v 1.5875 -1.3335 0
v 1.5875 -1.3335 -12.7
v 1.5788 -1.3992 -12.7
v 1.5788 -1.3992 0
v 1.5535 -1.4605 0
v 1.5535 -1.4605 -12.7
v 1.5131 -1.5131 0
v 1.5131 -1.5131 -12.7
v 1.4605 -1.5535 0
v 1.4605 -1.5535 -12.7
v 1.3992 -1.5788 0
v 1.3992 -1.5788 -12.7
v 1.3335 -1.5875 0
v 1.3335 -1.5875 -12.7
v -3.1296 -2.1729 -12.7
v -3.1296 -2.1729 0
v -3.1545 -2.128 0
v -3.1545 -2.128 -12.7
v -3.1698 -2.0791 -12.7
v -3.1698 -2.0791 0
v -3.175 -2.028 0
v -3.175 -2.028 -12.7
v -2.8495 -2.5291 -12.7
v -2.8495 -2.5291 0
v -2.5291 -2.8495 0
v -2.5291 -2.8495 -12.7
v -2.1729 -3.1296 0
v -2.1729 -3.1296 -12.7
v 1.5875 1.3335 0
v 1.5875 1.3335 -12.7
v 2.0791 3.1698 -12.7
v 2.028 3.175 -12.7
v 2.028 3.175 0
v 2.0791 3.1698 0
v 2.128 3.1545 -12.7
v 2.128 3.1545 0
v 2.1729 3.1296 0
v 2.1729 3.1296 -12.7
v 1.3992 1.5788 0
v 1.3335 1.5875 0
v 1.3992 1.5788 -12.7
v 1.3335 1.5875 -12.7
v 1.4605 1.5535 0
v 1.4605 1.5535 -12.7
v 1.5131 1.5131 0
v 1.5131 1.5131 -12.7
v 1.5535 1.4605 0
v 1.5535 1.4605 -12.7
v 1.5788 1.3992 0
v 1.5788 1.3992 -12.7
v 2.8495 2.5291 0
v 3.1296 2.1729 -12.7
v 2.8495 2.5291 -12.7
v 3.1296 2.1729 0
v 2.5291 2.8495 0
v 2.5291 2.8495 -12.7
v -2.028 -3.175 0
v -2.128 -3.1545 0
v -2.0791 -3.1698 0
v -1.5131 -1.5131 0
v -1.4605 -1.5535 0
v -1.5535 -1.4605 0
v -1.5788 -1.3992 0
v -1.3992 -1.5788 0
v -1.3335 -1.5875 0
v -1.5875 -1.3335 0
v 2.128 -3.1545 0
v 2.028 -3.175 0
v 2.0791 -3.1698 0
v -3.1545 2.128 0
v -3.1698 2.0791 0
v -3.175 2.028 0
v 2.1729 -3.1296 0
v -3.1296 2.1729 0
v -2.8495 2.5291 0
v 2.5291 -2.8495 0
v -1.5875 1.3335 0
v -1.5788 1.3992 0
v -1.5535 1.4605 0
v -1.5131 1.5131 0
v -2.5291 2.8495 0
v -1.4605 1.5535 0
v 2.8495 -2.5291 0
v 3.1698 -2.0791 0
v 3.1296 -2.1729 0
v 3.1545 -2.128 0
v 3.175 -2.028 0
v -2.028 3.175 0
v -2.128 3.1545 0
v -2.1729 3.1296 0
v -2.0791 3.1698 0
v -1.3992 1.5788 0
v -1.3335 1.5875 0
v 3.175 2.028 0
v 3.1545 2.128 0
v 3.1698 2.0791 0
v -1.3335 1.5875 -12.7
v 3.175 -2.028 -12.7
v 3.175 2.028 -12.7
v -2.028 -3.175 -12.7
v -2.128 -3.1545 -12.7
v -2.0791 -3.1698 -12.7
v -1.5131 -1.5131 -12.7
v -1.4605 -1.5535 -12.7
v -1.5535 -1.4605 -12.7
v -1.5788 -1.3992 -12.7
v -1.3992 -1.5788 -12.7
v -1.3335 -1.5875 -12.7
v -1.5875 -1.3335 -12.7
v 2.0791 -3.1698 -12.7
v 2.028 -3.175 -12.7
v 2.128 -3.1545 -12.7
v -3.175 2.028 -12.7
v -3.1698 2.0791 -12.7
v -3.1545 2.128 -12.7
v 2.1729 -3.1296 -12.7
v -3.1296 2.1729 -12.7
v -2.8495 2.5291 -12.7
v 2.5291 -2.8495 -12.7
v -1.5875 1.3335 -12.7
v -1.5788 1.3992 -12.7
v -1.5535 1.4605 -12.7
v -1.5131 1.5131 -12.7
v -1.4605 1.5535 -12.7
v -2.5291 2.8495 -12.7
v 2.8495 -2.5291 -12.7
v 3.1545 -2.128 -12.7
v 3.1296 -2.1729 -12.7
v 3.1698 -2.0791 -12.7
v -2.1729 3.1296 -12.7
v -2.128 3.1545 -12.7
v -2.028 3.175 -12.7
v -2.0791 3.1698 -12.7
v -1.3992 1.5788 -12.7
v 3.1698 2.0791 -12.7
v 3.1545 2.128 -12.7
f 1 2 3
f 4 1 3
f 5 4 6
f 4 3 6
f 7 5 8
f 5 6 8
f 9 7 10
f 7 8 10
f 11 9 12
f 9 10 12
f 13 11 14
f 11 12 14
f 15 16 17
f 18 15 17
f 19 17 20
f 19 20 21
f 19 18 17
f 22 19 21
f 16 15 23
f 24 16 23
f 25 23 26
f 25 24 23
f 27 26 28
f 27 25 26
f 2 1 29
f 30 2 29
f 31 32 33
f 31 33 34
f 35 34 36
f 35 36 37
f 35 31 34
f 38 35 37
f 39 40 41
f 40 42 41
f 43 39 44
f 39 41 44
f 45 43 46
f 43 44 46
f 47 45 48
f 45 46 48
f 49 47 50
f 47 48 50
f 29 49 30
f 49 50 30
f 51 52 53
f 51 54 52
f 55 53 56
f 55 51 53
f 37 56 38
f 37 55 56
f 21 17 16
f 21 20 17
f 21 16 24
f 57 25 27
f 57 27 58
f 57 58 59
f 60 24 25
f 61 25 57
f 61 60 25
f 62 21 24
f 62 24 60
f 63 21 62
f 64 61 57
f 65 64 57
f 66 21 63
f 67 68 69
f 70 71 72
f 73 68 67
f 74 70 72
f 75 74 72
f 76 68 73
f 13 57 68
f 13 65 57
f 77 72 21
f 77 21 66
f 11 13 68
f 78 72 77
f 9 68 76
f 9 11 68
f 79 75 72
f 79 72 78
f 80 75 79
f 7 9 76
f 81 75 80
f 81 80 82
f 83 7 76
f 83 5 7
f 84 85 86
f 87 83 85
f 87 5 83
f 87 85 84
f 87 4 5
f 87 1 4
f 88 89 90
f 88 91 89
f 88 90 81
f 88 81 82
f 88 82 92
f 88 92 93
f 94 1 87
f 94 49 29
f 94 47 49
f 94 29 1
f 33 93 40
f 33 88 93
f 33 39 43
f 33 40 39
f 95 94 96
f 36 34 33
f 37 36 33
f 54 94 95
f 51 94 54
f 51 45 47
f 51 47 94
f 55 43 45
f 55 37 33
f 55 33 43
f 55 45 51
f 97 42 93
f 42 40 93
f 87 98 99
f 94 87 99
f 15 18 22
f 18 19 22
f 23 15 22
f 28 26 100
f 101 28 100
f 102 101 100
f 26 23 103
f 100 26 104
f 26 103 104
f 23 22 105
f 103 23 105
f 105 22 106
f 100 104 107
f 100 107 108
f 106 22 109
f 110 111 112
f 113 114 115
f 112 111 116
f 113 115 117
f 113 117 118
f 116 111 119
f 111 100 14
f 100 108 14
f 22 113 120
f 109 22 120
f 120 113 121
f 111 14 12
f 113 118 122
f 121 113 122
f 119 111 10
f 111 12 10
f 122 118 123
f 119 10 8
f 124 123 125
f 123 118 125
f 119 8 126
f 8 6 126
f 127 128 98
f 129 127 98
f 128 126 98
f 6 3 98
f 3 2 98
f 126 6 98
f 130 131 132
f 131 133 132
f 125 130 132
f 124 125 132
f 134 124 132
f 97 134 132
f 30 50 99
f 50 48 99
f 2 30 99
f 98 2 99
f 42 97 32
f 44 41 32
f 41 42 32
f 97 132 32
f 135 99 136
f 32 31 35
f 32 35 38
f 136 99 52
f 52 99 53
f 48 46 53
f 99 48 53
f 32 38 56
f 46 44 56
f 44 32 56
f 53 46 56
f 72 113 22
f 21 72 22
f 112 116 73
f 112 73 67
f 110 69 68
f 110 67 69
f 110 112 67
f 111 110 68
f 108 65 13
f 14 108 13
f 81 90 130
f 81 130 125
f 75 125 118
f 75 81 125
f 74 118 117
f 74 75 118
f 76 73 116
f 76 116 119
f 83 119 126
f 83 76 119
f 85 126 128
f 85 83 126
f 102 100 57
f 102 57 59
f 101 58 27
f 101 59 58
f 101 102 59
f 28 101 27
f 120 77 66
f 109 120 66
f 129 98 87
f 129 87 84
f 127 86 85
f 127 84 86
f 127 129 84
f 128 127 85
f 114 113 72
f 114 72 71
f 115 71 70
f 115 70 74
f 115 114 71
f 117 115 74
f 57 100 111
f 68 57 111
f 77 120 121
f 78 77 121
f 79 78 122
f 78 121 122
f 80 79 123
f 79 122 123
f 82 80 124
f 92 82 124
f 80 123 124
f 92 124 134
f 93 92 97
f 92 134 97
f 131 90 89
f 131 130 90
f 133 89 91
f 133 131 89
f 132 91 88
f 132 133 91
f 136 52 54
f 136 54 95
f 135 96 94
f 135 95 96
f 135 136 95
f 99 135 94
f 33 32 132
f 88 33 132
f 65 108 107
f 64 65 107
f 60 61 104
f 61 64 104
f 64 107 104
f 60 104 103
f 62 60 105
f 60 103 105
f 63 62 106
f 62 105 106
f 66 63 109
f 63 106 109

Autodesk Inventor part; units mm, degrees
ref_plane "YZ Plane" through (0, 0, 0) normal (1, 0, 0) x (0, 1, 0)
ref_plane "XZ Plane" through (0, 0, 0) normal (0, 1, 0) x (-1, 0, 0)
ref_plane "XY Plane" through (0, 0, 0) normal (0, 0, 1) x (1, 0, 0)
sketch "Sketch1" plane through (0, 0, 0) normal (0, 0, 1) x (1, 0, 0)
  line L0 (-3.175, -3.175) -> (3.175, -3.175)
  line L1 (3.175, -3.175) -> (3.175, 3.175)
  line L2 (3.175, 3.175) -> (-3.175, 3.175)
  line L3 (-3.175, 3.175) -> (-3.175, -3.175)
  line L4 (-3.175, -3.175) -> (3.175, 3.175) construction
  line L5 (3.175, -3.175) -> (-3.175, 3.175) construction
  circle A0 centre (0, 0) radius 3.81
  point P0 (2.1061, -3.175)
  point P1 (3.175, -2.1061)
  point P2 (3.175, 2.1061)
  point P3 (2.1061, 3.175)
  point P4 (-2.1061, 3.175)
  point P5 (-3.175, 2.1061)
  point P6 (-3.175, -2.1061)
  point P7 (-2.1061, -3.175)
  dimension "d0" = 7.62
  dimension "d1" = 6.35
extrude "Extrusion1" add sketch "Sketch1" against normal blind 12.7 contours A0 L3 L2 L1 L0
sketch "Sketch2" plane through (0, 0, 0) normal (0, 0, 1) x (1, 0, 0)
  arc A0 (-3.175, -2.1061) -> (-2.1061, -3.175) centre (0, 0) ccw construction
  line L0 (-1.5875, -1.5875) -> (1.5875, -1.5875)
  line L1 (1.5875, -1.5875) -> (1.5875, 1.5875)
  line L2 (1.5875, 1.5875) -> (-1.5875, 1.5875)
  line L3 (-1.5875, 1.5875) -> (-1.5875, -1.5875)
  line L4 (-1.5875, -1.5875) -> (1.5875, 1.5875) construction
  line L5 (1.5875, -1.5875) -> (-1.5875, 1.5875) construction
  dimension "d7" = 3.175
extrude "Extrusion2" cut sketch "Sketch2" against normal blind 12.7
fillet "Fillet1" radius 0.254 12 edges at (-1.5875, -1.5875, -6.35) (-1.5875, 1.5875, -6.35) (1.5875, 1.5875, -6.35) (1.5875, -1.5875, -6.35) (2.1061, 3.175, -6.35) (3.175, 2.1061, -6.35) (3.175, -2.1061, -6.35) (2.1061, -3.175, -6.35) (-2.1061, -3.175, -6.35) (-3.175, -2.1061, -6.35) (-3.175, 2.1061, -6.35) (-2.1061, 3.175, -6.35)
properties part number "HS Shaft Adapter Square"
